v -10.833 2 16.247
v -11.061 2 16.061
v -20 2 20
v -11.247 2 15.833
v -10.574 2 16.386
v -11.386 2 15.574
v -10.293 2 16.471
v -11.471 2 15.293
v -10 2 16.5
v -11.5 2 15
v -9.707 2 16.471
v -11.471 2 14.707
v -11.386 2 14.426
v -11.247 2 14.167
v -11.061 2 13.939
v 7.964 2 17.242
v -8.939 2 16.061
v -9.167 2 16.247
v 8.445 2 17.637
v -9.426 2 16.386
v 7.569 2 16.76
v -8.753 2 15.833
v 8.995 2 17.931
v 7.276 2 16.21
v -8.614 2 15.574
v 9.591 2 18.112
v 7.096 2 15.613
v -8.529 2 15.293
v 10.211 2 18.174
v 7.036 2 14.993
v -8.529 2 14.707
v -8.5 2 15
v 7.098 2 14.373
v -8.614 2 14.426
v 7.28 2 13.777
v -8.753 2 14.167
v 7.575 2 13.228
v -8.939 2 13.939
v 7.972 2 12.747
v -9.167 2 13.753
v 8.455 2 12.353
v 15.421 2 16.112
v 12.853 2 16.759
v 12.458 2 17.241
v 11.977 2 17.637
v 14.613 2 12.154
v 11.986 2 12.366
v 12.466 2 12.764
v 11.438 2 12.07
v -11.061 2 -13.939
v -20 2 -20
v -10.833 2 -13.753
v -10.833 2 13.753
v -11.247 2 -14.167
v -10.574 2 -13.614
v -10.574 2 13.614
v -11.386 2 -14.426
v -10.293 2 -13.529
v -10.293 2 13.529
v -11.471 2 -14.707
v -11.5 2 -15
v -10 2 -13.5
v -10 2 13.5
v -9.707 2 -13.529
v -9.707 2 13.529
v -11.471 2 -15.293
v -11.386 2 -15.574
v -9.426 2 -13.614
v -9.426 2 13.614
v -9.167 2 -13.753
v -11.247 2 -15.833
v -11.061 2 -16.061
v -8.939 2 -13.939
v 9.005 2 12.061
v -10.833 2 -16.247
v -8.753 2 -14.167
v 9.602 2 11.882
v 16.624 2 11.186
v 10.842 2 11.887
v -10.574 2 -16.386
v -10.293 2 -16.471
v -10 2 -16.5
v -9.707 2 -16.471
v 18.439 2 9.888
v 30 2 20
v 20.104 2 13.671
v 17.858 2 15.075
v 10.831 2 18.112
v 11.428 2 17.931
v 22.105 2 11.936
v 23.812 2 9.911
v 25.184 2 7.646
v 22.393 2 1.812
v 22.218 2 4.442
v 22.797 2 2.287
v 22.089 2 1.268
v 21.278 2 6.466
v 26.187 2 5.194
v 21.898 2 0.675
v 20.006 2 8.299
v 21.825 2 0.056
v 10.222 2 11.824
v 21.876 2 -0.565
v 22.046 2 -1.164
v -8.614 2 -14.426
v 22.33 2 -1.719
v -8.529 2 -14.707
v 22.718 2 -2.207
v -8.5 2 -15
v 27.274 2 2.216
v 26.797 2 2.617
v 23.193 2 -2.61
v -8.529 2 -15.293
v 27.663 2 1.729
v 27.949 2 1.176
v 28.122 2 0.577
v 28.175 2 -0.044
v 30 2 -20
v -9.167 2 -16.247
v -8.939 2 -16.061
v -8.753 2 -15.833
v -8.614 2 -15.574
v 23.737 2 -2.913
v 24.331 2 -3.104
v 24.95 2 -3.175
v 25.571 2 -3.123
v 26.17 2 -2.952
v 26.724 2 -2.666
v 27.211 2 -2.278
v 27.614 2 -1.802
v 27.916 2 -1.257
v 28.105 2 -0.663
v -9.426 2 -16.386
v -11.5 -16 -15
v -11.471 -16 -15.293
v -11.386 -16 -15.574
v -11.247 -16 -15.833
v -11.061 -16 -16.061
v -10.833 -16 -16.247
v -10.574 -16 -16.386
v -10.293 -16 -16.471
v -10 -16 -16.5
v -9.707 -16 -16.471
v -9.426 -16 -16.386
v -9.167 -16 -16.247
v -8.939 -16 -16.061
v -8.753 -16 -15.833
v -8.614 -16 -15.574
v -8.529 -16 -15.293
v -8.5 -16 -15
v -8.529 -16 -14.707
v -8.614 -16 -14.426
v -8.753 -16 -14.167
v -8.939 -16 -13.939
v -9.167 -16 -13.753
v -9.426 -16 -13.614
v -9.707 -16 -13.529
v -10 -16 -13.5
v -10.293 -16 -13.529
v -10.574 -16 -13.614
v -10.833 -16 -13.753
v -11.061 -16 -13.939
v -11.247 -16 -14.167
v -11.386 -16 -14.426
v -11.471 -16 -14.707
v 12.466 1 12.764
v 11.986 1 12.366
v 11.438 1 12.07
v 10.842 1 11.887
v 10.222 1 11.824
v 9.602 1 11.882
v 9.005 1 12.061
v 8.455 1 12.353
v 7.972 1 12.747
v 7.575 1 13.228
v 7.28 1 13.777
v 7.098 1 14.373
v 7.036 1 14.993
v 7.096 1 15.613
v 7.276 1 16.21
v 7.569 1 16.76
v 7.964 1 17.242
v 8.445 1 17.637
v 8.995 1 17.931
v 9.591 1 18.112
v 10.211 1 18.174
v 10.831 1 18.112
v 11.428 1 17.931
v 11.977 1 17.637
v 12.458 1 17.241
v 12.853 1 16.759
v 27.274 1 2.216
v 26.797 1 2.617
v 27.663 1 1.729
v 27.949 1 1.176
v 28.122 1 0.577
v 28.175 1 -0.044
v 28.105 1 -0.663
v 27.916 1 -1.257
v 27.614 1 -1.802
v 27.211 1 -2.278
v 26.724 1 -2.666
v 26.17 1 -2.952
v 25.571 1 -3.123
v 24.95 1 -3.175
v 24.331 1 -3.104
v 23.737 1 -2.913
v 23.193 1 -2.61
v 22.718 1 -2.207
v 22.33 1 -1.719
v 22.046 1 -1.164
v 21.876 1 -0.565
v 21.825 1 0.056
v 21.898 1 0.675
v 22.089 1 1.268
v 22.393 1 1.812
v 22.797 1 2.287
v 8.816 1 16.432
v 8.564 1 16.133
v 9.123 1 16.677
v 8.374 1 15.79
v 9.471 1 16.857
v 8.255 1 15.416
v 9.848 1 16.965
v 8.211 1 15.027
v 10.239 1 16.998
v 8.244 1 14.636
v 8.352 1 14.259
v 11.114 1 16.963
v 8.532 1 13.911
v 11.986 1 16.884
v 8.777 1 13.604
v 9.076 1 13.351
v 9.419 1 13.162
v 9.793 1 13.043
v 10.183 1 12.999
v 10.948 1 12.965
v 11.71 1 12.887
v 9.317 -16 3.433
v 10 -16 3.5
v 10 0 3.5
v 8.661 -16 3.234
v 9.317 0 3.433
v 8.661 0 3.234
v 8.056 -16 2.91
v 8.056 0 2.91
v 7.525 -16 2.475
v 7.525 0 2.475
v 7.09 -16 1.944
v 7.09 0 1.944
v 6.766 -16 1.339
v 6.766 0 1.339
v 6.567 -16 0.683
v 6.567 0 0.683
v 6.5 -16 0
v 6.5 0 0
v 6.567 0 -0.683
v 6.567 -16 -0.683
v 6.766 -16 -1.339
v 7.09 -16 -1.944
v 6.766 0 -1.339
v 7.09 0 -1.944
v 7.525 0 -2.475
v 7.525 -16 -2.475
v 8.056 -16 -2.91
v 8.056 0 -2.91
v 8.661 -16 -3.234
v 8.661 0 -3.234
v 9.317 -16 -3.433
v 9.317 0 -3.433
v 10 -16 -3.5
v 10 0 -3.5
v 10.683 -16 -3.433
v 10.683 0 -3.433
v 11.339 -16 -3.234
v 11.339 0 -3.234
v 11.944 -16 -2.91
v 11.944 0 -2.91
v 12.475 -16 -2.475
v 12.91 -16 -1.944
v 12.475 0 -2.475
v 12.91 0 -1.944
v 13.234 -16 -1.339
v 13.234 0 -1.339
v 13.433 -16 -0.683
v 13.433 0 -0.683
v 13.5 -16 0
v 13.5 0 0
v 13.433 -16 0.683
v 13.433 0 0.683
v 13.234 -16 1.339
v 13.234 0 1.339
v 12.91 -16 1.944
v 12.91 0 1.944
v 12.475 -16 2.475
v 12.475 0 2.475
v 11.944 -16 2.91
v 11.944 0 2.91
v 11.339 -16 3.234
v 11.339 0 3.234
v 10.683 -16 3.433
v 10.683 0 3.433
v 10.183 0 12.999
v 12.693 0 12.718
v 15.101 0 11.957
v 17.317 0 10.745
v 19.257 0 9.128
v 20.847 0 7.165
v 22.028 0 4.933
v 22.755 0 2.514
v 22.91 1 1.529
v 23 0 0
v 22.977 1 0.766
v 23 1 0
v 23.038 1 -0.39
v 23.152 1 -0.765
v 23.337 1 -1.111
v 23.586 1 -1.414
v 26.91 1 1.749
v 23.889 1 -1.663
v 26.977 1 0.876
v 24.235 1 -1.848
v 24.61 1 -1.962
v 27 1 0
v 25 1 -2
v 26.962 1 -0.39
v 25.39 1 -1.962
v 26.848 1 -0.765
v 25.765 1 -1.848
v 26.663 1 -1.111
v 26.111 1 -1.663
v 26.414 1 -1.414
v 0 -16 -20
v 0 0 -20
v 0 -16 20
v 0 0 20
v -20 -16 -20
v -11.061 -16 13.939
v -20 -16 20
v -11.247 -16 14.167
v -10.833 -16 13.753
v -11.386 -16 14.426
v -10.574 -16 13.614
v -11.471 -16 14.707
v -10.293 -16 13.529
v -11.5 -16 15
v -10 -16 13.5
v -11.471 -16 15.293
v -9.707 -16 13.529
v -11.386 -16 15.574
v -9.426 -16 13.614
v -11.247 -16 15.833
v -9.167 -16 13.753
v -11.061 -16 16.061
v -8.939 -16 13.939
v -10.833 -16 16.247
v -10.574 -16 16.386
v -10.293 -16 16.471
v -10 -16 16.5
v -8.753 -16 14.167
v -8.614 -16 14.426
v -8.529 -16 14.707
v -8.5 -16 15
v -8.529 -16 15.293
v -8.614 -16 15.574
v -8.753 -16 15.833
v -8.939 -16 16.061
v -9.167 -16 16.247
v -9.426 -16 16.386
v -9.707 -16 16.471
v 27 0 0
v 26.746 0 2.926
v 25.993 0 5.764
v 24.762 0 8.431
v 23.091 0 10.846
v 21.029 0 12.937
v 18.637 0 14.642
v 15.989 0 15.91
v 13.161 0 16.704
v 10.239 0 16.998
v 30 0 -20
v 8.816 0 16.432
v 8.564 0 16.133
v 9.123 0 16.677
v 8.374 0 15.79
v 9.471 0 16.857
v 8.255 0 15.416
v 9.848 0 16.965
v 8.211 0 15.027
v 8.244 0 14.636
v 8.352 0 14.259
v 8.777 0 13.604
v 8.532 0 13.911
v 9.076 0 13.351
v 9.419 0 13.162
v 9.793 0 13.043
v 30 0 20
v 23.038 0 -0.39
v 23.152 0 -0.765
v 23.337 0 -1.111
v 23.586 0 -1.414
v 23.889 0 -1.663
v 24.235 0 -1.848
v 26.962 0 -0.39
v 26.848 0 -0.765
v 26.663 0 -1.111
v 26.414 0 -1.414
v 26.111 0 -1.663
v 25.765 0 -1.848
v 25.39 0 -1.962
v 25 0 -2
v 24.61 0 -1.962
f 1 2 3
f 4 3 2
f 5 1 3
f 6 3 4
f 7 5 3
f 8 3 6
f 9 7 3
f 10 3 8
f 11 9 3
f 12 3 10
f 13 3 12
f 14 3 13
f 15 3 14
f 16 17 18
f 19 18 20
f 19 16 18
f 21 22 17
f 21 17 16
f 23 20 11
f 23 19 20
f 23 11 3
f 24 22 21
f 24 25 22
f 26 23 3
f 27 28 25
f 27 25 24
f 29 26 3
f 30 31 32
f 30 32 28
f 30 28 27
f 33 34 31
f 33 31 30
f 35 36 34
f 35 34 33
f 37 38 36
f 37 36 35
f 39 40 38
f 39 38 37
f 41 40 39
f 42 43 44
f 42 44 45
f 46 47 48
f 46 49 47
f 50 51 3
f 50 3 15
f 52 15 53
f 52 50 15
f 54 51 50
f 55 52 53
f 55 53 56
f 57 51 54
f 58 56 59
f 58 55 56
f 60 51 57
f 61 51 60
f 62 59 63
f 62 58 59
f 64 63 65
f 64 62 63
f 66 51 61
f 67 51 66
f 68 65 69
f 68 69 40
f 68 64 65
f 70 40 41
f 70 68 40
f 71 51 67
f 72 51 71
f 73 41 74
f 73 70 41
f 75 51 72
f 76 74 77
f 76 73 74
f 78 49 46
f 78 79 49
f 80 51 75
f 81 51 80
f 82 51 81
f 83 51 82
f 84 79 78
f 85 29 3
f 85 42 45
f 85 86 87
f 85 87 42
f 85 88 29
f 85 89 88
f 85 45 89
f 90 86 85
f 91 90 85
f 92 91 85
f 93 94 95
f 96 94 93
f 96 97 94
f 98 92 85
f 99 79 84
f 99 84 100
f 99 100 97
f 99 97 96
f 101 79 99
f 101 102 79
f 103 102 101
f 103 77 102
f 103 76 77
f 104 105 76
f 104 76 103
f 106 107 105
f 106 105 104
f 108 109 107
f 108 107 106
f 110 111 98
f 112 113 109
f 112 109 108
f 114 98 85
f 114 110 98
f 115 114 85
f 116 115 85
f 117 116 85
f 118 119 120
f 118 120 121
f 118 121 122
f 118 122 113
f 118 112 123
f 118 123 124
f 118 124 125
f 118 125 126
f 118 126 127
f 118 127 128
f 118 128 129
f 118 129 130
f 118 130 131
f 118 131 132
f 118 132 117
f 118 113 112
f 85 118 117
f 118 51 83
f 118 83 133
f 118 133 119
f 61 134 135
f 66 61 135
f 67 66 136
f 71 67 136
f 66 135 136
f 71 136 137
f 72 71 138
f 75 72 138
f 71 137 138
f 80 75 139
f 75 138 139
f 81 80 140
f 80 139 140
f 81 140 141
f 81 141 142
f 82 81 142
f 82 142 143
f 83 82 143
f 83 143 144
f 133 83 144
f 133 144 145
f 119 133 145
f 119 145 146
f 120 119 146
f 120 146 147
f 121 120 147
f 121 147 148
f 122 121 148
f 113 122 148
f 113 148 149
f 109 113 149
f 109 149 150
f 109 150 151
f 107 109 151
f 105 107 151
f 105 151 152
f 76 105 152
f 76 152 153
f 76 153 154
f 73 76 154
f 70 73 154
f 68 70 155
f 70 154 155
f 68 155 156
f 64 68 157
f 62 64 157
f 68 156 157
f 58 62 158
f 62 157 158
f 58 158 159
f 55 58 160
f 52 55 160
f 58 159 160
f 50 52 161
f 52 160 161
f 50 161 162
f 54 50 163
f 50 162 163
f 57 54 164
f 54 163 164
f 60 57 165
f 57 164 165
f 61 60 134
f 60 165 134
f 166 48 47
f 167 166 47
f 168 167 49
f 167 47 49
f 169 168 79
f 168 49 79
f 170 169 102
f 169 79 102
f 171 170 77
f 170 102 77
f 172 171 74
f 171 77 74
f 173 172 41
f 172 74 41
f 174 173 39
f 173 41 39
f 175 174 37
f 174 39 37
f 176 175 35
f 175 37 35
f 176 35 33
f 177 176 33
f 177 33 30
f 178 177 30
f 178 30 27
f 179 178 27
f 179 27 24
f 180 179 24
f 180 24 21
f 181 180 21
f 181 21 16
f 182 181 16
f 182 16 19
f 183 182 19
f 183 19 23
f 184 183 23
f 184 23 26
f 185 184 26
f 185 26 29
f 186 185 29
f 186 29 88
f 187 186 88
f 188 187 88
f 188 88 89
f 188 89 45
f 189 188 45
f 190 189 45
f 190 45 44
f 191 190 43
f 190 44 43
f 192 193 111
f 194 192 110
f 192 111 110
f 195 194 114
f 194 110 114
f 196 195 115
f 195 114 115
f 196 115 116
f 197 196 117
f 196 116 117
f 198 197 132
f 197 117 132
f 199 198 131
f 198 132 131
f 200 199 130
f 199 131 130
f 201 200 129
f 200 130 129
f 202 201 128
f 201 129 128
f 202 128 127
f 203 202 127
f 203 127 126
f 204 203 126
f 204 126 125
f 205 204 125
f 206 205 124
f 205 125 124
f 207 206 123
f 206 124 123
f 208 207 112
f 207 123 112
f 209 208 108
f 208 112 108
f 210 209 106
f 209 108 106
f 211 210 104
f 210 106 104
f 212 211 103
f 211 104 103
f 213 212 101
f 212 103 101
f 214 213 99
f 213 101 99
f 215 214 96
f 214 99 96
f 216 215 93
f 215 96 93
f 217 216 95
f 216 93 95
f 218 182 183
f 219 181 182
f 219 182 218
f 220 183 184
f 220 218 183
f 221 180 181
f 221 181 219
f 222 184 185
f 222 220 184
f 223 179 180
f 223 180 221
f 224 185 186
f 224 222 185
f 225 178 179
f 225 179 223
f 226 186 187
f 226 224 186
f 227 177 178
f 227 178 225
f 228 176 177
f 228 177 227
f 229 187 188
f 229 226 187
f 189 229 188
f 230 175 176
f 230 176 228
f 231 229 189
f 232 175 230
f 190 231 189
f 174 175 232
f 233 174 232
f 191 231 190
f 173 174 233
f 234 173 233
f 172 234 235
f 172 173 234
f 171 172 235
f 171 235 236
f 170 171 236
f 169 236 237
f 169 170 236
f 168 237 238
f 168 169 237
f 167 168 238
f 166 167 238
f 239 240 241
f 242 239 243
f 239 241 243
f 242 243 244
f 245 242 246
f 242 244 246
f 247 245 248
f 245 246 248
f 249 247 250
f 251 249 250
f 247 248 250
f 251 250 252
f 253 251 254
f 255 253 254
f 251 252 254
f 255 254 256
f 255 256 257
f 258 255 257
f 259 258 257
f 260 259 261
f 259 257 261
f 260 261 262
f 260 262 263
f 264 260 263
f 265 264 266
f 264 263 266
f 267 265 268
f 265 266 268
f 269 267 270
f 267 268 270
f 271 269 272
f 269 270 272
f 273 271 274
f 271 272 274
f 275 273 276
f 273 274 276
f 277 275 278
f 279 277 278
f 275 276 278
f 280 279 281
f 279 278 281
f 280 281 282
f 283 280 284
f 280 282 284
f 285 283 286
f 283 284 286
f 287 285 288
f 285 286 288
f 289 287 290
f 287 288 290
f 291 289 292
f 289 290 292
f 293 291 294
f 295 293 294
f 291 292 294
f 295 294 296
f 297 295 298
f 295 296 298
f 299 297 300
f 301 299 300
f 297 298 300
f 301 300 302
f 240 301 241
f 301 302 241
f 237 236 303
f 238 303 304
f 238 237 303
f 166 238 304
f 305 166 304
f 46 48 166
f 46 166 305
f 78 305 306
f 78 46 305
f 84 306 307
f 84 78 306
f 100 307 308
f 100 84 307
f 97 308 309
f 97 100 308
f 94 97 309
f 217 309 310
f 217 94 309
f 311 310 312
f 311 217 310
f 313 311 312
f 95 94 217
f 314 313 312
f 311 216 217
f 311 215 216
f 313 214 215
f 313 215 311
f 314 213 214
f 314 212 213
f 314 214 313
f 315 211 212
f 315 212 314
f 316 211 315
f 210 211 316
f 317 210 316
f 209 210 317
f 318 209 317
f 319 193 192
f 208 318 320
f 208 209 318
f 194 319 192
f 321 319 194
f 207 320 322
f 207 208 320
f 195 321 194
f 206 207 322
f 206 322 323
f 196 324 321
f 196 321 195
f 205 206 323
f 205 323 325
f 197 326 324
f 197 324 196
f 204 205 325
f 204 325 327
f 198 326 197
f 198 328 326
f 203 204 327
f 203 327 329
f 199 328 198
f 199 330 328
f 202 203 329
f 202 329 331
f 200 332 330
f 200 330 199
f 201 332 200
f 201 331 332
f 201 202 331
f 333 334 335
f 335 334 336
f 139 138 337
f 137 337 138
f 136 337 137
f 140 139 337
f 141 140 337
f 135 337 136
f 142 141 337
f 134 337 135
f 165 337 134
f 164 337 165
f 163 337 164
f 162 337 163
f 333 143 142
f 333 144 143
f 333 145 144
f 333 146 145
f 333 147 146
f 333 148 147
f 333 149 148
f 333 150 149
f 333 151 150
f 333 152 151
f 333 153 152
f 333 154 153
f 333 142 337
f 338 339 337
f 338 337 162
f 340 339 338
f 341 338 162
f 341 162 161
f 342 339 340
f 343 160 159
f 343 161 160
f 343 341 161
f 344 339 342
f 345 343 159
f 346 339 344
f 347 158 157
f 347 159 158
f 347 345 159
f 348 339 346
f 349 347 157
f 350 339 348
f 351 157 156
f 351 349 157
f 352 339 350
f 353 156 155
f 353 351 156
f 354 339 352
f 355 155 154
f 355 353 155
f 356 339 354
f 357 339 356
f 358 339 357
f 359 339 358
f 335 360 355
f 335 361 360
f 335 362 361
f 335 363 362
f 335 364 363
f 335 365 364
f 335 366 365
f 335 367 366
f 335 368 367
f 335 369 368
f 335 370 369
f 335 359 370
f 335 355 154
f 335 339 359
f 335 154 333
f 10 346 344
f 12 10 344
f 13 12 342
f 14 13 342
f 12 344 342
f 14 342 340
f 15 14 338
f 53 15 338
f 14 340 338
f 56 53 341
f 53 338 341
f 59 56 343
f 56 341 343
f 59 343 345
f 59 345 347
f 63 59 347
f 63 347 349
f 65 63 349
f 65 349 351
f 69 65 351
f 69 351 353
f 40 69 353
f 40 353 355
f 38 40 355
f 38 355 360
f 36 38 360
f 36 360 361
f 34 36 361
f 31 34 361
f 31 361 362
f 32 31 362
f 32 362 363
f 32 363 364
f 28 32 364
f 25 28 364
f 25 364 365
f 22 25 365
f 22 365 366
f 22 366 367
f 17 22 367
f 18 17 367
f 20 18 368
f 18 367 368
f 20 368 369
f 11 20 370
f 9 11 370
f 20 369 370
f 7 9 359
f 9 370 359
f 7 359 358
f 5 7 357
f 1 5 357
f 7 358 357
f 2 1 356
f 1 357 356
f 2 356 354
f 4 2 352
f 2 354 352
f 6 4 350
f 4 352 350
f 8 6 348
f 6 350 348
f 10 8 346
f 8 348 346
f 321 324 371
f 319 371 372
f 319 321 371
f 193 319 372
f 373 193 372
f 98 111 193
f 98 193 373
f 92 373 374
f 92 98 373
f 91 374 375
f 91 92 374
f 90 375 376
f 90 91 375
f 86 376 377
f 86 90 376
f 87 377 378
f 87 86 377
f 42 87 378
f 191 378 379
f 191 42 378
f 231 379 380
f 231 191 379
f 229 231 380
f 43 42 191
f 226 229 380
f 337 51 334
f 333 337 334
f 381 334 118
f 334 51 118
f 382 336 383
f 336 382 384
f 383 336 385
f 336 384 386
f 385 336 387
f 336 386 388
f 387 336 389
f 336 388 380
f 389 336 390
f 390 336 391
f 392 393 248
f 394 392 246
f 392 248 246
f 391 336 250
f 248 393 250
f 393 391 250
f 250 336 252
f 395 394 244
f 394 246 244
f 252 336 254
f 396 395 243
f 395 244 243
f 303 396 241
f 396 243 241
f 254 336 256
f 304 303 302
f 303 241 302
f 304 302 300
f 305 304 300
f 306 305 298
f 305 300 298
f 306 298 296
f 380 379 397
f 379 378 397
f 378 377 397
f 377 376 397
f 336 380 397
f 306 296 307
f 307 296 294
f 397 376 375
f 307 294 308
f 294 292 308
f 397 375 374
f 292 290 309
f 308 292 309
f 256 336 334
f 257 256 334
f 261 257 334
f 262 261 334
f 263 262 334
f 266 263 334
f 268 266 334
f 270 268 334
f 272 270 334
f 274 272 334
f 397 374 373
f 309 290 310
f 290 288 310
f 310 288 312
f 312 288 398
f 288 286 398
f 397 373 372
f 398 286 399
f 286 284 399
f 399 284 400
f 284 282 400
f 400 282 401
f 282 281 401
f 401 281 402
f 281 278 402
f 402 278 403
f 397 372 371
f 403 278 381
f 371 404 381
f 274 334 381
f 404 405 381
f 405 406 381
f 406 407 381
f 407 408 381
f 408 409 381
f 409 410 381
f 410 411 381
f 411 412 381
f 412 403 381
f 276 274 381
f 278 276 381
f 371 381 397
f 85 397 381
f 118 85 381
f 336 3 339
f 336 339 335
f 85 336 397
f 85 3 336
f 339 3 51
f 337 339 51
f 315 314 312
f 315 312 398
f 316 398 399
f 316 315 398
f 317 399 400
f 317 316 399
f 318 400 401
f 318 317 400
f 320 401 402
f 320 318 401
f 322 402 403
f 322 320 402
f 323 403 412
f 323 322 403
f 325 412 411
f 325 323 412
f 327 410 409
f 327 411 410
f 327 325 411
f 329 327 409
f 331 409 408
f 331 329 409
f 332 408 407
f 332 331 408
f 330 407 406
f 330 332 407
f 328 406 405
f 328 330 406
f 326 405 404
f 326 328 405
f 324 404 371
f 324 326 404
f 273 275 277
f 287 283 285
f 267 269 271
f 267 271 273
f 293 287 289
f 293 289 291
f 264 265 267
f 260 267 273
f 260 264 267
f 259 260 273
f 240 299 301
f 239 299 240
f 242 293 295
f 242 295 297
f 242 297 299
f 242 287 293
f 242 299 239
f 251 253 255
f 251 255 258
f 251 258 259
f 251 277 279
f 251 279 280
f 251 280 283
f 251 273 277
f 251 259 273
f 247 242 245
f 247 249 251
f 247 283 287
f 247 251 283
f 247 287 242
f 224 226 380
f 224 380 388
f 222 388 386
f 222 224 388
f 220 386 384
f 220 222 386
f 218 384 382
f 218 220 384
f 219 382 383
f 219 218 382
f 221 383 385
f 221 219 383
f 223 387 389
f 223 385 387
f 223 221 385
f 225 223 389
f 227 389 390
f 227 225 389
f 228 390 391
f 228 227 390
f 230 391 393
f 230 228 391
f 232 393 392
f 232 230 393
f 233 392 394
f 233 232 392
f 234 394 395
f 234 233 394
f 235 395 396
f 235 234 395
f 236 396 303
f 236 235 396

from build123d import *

# Parameters (mm, degrees)
SKETCH1_W             = 60
SKETCH1_H             = 40
BOSS_EXTRUDE1_DEPTH   = 2
CUT_EXTRUDE1_DEPTH    = 14
SKETCH6_W             = 30
SKETCH6_H             = 40
BOSS_EXTRUDE4_DEPTH   = 16
SKETCH8_R             = 3.5
BOSS_EXTRUDE5_DEPTH   = 16
SKETCH9_R             = 3.175
CUT_EXTRUDE2_DEPTH    = 1
SKETCH10_W            = 10
SKETCH10_H            = 40
CUT_EXTRUDE3_DEPTH    = 30
F_3_0MM_DOWEL_HOLE1_D = 3


with BuildPart() as part:
    # Sketch1 → Boss-Extrude1 (new body)
    with BuildSketch(Plane(origin=(0, 0, 0), x_dir=(1, 0, 0), z_dir=(0, 1, 0))):
        Rectangle(SKETCH1_W, SKETCH1_H)
    extrude(amount=BOSS_EXTRUDE1_DEPTH)

    # Sketch4 → Cut-Extrude1 (cut)
    with BuildSketch(Plane(origin=(0, 2, 0), x_dir=(1, 0, 0), z_dir=(0, 1, 0))):
        with BuildLine():
            ThreePointArc((27, 0), (22.104938303, -11.936099391), (10.23876839, -16.998323142))
            ThreePointArc((10.23876839, -16.998323142), (8.210875269, -15.026610819), (10.182587592, -12.998717697))
            ThreePointArc((10.182587592, -12.998717697), (19.256717526, -9.127605417), (23, 0))
            ThreePointArc((23, 0), (25, 2), (27, 0))
        make_face()
    extrude(amount=-CUT_EXTRUDE1_DEPTH, mode=Mode.SUBTRACT)

    # Sketch6 → Boss-Extrude4 (add)
    with BuildSketch(Plane.XZ):
        with Locations((-15, 0)):
            Rectangle(SKETCH6_W, SKETCH6_H)
    extrude(amount=BOSS_EXTRUDE4_DEPTH)

    # Sketch8 → Boss-Extrude5 (add)
    with BuildSketch(Plane.XZ):
        with Locations(Location((10, 0, 0), (0, 0, 90))):
            Circle(SKETCH8_R)
    extrude(amount=BOSS_EXTRUDE5_DEPTH)

    # Sketch9 → Cut-Extrude2 (cut)
    with BuildSketch(Plane(origin=(0, 2, 0), x_dir=(1, 0, 0), z_dir=(0, 1, 0))):
        with Locations((25, 0)):
            Circle(SKETCH9_R)
        with Locations((10.210677991, -14.99852042)):
            Circle(SKETCH9_R)
    extrude(amount=-CUT_EXTRUDE2_DEPTH, mode=Mode.SUBTRACT)

    # Sketch10 → Cut-Extrude3 (cut)
    with BuildSketch(Plane(origin=(0, 2, 0), x_dir=(1, 0, 0), z_dir=(0, 1, 0))):
        with Locations((-25, 0)):
            Rectangle(SKETCH10_W, SKETCH10_H)
    extrude(amount=-CUT_EXTRUDE3_DEPTH, mode=Mode.SUBTRACT)

    # Ø3.0mm Dowel Hole1 (through all)
    with Locations(Plane(origin=(0, 2, 0), x_dir=(1, 0, 0), z_dir=(0, 1, 0))):
        with Locations((-10, 15), (-10, -15)):
            Hole(F_3_0MM_DOWEL_HOLE1_D / 2)


solid = part.part
